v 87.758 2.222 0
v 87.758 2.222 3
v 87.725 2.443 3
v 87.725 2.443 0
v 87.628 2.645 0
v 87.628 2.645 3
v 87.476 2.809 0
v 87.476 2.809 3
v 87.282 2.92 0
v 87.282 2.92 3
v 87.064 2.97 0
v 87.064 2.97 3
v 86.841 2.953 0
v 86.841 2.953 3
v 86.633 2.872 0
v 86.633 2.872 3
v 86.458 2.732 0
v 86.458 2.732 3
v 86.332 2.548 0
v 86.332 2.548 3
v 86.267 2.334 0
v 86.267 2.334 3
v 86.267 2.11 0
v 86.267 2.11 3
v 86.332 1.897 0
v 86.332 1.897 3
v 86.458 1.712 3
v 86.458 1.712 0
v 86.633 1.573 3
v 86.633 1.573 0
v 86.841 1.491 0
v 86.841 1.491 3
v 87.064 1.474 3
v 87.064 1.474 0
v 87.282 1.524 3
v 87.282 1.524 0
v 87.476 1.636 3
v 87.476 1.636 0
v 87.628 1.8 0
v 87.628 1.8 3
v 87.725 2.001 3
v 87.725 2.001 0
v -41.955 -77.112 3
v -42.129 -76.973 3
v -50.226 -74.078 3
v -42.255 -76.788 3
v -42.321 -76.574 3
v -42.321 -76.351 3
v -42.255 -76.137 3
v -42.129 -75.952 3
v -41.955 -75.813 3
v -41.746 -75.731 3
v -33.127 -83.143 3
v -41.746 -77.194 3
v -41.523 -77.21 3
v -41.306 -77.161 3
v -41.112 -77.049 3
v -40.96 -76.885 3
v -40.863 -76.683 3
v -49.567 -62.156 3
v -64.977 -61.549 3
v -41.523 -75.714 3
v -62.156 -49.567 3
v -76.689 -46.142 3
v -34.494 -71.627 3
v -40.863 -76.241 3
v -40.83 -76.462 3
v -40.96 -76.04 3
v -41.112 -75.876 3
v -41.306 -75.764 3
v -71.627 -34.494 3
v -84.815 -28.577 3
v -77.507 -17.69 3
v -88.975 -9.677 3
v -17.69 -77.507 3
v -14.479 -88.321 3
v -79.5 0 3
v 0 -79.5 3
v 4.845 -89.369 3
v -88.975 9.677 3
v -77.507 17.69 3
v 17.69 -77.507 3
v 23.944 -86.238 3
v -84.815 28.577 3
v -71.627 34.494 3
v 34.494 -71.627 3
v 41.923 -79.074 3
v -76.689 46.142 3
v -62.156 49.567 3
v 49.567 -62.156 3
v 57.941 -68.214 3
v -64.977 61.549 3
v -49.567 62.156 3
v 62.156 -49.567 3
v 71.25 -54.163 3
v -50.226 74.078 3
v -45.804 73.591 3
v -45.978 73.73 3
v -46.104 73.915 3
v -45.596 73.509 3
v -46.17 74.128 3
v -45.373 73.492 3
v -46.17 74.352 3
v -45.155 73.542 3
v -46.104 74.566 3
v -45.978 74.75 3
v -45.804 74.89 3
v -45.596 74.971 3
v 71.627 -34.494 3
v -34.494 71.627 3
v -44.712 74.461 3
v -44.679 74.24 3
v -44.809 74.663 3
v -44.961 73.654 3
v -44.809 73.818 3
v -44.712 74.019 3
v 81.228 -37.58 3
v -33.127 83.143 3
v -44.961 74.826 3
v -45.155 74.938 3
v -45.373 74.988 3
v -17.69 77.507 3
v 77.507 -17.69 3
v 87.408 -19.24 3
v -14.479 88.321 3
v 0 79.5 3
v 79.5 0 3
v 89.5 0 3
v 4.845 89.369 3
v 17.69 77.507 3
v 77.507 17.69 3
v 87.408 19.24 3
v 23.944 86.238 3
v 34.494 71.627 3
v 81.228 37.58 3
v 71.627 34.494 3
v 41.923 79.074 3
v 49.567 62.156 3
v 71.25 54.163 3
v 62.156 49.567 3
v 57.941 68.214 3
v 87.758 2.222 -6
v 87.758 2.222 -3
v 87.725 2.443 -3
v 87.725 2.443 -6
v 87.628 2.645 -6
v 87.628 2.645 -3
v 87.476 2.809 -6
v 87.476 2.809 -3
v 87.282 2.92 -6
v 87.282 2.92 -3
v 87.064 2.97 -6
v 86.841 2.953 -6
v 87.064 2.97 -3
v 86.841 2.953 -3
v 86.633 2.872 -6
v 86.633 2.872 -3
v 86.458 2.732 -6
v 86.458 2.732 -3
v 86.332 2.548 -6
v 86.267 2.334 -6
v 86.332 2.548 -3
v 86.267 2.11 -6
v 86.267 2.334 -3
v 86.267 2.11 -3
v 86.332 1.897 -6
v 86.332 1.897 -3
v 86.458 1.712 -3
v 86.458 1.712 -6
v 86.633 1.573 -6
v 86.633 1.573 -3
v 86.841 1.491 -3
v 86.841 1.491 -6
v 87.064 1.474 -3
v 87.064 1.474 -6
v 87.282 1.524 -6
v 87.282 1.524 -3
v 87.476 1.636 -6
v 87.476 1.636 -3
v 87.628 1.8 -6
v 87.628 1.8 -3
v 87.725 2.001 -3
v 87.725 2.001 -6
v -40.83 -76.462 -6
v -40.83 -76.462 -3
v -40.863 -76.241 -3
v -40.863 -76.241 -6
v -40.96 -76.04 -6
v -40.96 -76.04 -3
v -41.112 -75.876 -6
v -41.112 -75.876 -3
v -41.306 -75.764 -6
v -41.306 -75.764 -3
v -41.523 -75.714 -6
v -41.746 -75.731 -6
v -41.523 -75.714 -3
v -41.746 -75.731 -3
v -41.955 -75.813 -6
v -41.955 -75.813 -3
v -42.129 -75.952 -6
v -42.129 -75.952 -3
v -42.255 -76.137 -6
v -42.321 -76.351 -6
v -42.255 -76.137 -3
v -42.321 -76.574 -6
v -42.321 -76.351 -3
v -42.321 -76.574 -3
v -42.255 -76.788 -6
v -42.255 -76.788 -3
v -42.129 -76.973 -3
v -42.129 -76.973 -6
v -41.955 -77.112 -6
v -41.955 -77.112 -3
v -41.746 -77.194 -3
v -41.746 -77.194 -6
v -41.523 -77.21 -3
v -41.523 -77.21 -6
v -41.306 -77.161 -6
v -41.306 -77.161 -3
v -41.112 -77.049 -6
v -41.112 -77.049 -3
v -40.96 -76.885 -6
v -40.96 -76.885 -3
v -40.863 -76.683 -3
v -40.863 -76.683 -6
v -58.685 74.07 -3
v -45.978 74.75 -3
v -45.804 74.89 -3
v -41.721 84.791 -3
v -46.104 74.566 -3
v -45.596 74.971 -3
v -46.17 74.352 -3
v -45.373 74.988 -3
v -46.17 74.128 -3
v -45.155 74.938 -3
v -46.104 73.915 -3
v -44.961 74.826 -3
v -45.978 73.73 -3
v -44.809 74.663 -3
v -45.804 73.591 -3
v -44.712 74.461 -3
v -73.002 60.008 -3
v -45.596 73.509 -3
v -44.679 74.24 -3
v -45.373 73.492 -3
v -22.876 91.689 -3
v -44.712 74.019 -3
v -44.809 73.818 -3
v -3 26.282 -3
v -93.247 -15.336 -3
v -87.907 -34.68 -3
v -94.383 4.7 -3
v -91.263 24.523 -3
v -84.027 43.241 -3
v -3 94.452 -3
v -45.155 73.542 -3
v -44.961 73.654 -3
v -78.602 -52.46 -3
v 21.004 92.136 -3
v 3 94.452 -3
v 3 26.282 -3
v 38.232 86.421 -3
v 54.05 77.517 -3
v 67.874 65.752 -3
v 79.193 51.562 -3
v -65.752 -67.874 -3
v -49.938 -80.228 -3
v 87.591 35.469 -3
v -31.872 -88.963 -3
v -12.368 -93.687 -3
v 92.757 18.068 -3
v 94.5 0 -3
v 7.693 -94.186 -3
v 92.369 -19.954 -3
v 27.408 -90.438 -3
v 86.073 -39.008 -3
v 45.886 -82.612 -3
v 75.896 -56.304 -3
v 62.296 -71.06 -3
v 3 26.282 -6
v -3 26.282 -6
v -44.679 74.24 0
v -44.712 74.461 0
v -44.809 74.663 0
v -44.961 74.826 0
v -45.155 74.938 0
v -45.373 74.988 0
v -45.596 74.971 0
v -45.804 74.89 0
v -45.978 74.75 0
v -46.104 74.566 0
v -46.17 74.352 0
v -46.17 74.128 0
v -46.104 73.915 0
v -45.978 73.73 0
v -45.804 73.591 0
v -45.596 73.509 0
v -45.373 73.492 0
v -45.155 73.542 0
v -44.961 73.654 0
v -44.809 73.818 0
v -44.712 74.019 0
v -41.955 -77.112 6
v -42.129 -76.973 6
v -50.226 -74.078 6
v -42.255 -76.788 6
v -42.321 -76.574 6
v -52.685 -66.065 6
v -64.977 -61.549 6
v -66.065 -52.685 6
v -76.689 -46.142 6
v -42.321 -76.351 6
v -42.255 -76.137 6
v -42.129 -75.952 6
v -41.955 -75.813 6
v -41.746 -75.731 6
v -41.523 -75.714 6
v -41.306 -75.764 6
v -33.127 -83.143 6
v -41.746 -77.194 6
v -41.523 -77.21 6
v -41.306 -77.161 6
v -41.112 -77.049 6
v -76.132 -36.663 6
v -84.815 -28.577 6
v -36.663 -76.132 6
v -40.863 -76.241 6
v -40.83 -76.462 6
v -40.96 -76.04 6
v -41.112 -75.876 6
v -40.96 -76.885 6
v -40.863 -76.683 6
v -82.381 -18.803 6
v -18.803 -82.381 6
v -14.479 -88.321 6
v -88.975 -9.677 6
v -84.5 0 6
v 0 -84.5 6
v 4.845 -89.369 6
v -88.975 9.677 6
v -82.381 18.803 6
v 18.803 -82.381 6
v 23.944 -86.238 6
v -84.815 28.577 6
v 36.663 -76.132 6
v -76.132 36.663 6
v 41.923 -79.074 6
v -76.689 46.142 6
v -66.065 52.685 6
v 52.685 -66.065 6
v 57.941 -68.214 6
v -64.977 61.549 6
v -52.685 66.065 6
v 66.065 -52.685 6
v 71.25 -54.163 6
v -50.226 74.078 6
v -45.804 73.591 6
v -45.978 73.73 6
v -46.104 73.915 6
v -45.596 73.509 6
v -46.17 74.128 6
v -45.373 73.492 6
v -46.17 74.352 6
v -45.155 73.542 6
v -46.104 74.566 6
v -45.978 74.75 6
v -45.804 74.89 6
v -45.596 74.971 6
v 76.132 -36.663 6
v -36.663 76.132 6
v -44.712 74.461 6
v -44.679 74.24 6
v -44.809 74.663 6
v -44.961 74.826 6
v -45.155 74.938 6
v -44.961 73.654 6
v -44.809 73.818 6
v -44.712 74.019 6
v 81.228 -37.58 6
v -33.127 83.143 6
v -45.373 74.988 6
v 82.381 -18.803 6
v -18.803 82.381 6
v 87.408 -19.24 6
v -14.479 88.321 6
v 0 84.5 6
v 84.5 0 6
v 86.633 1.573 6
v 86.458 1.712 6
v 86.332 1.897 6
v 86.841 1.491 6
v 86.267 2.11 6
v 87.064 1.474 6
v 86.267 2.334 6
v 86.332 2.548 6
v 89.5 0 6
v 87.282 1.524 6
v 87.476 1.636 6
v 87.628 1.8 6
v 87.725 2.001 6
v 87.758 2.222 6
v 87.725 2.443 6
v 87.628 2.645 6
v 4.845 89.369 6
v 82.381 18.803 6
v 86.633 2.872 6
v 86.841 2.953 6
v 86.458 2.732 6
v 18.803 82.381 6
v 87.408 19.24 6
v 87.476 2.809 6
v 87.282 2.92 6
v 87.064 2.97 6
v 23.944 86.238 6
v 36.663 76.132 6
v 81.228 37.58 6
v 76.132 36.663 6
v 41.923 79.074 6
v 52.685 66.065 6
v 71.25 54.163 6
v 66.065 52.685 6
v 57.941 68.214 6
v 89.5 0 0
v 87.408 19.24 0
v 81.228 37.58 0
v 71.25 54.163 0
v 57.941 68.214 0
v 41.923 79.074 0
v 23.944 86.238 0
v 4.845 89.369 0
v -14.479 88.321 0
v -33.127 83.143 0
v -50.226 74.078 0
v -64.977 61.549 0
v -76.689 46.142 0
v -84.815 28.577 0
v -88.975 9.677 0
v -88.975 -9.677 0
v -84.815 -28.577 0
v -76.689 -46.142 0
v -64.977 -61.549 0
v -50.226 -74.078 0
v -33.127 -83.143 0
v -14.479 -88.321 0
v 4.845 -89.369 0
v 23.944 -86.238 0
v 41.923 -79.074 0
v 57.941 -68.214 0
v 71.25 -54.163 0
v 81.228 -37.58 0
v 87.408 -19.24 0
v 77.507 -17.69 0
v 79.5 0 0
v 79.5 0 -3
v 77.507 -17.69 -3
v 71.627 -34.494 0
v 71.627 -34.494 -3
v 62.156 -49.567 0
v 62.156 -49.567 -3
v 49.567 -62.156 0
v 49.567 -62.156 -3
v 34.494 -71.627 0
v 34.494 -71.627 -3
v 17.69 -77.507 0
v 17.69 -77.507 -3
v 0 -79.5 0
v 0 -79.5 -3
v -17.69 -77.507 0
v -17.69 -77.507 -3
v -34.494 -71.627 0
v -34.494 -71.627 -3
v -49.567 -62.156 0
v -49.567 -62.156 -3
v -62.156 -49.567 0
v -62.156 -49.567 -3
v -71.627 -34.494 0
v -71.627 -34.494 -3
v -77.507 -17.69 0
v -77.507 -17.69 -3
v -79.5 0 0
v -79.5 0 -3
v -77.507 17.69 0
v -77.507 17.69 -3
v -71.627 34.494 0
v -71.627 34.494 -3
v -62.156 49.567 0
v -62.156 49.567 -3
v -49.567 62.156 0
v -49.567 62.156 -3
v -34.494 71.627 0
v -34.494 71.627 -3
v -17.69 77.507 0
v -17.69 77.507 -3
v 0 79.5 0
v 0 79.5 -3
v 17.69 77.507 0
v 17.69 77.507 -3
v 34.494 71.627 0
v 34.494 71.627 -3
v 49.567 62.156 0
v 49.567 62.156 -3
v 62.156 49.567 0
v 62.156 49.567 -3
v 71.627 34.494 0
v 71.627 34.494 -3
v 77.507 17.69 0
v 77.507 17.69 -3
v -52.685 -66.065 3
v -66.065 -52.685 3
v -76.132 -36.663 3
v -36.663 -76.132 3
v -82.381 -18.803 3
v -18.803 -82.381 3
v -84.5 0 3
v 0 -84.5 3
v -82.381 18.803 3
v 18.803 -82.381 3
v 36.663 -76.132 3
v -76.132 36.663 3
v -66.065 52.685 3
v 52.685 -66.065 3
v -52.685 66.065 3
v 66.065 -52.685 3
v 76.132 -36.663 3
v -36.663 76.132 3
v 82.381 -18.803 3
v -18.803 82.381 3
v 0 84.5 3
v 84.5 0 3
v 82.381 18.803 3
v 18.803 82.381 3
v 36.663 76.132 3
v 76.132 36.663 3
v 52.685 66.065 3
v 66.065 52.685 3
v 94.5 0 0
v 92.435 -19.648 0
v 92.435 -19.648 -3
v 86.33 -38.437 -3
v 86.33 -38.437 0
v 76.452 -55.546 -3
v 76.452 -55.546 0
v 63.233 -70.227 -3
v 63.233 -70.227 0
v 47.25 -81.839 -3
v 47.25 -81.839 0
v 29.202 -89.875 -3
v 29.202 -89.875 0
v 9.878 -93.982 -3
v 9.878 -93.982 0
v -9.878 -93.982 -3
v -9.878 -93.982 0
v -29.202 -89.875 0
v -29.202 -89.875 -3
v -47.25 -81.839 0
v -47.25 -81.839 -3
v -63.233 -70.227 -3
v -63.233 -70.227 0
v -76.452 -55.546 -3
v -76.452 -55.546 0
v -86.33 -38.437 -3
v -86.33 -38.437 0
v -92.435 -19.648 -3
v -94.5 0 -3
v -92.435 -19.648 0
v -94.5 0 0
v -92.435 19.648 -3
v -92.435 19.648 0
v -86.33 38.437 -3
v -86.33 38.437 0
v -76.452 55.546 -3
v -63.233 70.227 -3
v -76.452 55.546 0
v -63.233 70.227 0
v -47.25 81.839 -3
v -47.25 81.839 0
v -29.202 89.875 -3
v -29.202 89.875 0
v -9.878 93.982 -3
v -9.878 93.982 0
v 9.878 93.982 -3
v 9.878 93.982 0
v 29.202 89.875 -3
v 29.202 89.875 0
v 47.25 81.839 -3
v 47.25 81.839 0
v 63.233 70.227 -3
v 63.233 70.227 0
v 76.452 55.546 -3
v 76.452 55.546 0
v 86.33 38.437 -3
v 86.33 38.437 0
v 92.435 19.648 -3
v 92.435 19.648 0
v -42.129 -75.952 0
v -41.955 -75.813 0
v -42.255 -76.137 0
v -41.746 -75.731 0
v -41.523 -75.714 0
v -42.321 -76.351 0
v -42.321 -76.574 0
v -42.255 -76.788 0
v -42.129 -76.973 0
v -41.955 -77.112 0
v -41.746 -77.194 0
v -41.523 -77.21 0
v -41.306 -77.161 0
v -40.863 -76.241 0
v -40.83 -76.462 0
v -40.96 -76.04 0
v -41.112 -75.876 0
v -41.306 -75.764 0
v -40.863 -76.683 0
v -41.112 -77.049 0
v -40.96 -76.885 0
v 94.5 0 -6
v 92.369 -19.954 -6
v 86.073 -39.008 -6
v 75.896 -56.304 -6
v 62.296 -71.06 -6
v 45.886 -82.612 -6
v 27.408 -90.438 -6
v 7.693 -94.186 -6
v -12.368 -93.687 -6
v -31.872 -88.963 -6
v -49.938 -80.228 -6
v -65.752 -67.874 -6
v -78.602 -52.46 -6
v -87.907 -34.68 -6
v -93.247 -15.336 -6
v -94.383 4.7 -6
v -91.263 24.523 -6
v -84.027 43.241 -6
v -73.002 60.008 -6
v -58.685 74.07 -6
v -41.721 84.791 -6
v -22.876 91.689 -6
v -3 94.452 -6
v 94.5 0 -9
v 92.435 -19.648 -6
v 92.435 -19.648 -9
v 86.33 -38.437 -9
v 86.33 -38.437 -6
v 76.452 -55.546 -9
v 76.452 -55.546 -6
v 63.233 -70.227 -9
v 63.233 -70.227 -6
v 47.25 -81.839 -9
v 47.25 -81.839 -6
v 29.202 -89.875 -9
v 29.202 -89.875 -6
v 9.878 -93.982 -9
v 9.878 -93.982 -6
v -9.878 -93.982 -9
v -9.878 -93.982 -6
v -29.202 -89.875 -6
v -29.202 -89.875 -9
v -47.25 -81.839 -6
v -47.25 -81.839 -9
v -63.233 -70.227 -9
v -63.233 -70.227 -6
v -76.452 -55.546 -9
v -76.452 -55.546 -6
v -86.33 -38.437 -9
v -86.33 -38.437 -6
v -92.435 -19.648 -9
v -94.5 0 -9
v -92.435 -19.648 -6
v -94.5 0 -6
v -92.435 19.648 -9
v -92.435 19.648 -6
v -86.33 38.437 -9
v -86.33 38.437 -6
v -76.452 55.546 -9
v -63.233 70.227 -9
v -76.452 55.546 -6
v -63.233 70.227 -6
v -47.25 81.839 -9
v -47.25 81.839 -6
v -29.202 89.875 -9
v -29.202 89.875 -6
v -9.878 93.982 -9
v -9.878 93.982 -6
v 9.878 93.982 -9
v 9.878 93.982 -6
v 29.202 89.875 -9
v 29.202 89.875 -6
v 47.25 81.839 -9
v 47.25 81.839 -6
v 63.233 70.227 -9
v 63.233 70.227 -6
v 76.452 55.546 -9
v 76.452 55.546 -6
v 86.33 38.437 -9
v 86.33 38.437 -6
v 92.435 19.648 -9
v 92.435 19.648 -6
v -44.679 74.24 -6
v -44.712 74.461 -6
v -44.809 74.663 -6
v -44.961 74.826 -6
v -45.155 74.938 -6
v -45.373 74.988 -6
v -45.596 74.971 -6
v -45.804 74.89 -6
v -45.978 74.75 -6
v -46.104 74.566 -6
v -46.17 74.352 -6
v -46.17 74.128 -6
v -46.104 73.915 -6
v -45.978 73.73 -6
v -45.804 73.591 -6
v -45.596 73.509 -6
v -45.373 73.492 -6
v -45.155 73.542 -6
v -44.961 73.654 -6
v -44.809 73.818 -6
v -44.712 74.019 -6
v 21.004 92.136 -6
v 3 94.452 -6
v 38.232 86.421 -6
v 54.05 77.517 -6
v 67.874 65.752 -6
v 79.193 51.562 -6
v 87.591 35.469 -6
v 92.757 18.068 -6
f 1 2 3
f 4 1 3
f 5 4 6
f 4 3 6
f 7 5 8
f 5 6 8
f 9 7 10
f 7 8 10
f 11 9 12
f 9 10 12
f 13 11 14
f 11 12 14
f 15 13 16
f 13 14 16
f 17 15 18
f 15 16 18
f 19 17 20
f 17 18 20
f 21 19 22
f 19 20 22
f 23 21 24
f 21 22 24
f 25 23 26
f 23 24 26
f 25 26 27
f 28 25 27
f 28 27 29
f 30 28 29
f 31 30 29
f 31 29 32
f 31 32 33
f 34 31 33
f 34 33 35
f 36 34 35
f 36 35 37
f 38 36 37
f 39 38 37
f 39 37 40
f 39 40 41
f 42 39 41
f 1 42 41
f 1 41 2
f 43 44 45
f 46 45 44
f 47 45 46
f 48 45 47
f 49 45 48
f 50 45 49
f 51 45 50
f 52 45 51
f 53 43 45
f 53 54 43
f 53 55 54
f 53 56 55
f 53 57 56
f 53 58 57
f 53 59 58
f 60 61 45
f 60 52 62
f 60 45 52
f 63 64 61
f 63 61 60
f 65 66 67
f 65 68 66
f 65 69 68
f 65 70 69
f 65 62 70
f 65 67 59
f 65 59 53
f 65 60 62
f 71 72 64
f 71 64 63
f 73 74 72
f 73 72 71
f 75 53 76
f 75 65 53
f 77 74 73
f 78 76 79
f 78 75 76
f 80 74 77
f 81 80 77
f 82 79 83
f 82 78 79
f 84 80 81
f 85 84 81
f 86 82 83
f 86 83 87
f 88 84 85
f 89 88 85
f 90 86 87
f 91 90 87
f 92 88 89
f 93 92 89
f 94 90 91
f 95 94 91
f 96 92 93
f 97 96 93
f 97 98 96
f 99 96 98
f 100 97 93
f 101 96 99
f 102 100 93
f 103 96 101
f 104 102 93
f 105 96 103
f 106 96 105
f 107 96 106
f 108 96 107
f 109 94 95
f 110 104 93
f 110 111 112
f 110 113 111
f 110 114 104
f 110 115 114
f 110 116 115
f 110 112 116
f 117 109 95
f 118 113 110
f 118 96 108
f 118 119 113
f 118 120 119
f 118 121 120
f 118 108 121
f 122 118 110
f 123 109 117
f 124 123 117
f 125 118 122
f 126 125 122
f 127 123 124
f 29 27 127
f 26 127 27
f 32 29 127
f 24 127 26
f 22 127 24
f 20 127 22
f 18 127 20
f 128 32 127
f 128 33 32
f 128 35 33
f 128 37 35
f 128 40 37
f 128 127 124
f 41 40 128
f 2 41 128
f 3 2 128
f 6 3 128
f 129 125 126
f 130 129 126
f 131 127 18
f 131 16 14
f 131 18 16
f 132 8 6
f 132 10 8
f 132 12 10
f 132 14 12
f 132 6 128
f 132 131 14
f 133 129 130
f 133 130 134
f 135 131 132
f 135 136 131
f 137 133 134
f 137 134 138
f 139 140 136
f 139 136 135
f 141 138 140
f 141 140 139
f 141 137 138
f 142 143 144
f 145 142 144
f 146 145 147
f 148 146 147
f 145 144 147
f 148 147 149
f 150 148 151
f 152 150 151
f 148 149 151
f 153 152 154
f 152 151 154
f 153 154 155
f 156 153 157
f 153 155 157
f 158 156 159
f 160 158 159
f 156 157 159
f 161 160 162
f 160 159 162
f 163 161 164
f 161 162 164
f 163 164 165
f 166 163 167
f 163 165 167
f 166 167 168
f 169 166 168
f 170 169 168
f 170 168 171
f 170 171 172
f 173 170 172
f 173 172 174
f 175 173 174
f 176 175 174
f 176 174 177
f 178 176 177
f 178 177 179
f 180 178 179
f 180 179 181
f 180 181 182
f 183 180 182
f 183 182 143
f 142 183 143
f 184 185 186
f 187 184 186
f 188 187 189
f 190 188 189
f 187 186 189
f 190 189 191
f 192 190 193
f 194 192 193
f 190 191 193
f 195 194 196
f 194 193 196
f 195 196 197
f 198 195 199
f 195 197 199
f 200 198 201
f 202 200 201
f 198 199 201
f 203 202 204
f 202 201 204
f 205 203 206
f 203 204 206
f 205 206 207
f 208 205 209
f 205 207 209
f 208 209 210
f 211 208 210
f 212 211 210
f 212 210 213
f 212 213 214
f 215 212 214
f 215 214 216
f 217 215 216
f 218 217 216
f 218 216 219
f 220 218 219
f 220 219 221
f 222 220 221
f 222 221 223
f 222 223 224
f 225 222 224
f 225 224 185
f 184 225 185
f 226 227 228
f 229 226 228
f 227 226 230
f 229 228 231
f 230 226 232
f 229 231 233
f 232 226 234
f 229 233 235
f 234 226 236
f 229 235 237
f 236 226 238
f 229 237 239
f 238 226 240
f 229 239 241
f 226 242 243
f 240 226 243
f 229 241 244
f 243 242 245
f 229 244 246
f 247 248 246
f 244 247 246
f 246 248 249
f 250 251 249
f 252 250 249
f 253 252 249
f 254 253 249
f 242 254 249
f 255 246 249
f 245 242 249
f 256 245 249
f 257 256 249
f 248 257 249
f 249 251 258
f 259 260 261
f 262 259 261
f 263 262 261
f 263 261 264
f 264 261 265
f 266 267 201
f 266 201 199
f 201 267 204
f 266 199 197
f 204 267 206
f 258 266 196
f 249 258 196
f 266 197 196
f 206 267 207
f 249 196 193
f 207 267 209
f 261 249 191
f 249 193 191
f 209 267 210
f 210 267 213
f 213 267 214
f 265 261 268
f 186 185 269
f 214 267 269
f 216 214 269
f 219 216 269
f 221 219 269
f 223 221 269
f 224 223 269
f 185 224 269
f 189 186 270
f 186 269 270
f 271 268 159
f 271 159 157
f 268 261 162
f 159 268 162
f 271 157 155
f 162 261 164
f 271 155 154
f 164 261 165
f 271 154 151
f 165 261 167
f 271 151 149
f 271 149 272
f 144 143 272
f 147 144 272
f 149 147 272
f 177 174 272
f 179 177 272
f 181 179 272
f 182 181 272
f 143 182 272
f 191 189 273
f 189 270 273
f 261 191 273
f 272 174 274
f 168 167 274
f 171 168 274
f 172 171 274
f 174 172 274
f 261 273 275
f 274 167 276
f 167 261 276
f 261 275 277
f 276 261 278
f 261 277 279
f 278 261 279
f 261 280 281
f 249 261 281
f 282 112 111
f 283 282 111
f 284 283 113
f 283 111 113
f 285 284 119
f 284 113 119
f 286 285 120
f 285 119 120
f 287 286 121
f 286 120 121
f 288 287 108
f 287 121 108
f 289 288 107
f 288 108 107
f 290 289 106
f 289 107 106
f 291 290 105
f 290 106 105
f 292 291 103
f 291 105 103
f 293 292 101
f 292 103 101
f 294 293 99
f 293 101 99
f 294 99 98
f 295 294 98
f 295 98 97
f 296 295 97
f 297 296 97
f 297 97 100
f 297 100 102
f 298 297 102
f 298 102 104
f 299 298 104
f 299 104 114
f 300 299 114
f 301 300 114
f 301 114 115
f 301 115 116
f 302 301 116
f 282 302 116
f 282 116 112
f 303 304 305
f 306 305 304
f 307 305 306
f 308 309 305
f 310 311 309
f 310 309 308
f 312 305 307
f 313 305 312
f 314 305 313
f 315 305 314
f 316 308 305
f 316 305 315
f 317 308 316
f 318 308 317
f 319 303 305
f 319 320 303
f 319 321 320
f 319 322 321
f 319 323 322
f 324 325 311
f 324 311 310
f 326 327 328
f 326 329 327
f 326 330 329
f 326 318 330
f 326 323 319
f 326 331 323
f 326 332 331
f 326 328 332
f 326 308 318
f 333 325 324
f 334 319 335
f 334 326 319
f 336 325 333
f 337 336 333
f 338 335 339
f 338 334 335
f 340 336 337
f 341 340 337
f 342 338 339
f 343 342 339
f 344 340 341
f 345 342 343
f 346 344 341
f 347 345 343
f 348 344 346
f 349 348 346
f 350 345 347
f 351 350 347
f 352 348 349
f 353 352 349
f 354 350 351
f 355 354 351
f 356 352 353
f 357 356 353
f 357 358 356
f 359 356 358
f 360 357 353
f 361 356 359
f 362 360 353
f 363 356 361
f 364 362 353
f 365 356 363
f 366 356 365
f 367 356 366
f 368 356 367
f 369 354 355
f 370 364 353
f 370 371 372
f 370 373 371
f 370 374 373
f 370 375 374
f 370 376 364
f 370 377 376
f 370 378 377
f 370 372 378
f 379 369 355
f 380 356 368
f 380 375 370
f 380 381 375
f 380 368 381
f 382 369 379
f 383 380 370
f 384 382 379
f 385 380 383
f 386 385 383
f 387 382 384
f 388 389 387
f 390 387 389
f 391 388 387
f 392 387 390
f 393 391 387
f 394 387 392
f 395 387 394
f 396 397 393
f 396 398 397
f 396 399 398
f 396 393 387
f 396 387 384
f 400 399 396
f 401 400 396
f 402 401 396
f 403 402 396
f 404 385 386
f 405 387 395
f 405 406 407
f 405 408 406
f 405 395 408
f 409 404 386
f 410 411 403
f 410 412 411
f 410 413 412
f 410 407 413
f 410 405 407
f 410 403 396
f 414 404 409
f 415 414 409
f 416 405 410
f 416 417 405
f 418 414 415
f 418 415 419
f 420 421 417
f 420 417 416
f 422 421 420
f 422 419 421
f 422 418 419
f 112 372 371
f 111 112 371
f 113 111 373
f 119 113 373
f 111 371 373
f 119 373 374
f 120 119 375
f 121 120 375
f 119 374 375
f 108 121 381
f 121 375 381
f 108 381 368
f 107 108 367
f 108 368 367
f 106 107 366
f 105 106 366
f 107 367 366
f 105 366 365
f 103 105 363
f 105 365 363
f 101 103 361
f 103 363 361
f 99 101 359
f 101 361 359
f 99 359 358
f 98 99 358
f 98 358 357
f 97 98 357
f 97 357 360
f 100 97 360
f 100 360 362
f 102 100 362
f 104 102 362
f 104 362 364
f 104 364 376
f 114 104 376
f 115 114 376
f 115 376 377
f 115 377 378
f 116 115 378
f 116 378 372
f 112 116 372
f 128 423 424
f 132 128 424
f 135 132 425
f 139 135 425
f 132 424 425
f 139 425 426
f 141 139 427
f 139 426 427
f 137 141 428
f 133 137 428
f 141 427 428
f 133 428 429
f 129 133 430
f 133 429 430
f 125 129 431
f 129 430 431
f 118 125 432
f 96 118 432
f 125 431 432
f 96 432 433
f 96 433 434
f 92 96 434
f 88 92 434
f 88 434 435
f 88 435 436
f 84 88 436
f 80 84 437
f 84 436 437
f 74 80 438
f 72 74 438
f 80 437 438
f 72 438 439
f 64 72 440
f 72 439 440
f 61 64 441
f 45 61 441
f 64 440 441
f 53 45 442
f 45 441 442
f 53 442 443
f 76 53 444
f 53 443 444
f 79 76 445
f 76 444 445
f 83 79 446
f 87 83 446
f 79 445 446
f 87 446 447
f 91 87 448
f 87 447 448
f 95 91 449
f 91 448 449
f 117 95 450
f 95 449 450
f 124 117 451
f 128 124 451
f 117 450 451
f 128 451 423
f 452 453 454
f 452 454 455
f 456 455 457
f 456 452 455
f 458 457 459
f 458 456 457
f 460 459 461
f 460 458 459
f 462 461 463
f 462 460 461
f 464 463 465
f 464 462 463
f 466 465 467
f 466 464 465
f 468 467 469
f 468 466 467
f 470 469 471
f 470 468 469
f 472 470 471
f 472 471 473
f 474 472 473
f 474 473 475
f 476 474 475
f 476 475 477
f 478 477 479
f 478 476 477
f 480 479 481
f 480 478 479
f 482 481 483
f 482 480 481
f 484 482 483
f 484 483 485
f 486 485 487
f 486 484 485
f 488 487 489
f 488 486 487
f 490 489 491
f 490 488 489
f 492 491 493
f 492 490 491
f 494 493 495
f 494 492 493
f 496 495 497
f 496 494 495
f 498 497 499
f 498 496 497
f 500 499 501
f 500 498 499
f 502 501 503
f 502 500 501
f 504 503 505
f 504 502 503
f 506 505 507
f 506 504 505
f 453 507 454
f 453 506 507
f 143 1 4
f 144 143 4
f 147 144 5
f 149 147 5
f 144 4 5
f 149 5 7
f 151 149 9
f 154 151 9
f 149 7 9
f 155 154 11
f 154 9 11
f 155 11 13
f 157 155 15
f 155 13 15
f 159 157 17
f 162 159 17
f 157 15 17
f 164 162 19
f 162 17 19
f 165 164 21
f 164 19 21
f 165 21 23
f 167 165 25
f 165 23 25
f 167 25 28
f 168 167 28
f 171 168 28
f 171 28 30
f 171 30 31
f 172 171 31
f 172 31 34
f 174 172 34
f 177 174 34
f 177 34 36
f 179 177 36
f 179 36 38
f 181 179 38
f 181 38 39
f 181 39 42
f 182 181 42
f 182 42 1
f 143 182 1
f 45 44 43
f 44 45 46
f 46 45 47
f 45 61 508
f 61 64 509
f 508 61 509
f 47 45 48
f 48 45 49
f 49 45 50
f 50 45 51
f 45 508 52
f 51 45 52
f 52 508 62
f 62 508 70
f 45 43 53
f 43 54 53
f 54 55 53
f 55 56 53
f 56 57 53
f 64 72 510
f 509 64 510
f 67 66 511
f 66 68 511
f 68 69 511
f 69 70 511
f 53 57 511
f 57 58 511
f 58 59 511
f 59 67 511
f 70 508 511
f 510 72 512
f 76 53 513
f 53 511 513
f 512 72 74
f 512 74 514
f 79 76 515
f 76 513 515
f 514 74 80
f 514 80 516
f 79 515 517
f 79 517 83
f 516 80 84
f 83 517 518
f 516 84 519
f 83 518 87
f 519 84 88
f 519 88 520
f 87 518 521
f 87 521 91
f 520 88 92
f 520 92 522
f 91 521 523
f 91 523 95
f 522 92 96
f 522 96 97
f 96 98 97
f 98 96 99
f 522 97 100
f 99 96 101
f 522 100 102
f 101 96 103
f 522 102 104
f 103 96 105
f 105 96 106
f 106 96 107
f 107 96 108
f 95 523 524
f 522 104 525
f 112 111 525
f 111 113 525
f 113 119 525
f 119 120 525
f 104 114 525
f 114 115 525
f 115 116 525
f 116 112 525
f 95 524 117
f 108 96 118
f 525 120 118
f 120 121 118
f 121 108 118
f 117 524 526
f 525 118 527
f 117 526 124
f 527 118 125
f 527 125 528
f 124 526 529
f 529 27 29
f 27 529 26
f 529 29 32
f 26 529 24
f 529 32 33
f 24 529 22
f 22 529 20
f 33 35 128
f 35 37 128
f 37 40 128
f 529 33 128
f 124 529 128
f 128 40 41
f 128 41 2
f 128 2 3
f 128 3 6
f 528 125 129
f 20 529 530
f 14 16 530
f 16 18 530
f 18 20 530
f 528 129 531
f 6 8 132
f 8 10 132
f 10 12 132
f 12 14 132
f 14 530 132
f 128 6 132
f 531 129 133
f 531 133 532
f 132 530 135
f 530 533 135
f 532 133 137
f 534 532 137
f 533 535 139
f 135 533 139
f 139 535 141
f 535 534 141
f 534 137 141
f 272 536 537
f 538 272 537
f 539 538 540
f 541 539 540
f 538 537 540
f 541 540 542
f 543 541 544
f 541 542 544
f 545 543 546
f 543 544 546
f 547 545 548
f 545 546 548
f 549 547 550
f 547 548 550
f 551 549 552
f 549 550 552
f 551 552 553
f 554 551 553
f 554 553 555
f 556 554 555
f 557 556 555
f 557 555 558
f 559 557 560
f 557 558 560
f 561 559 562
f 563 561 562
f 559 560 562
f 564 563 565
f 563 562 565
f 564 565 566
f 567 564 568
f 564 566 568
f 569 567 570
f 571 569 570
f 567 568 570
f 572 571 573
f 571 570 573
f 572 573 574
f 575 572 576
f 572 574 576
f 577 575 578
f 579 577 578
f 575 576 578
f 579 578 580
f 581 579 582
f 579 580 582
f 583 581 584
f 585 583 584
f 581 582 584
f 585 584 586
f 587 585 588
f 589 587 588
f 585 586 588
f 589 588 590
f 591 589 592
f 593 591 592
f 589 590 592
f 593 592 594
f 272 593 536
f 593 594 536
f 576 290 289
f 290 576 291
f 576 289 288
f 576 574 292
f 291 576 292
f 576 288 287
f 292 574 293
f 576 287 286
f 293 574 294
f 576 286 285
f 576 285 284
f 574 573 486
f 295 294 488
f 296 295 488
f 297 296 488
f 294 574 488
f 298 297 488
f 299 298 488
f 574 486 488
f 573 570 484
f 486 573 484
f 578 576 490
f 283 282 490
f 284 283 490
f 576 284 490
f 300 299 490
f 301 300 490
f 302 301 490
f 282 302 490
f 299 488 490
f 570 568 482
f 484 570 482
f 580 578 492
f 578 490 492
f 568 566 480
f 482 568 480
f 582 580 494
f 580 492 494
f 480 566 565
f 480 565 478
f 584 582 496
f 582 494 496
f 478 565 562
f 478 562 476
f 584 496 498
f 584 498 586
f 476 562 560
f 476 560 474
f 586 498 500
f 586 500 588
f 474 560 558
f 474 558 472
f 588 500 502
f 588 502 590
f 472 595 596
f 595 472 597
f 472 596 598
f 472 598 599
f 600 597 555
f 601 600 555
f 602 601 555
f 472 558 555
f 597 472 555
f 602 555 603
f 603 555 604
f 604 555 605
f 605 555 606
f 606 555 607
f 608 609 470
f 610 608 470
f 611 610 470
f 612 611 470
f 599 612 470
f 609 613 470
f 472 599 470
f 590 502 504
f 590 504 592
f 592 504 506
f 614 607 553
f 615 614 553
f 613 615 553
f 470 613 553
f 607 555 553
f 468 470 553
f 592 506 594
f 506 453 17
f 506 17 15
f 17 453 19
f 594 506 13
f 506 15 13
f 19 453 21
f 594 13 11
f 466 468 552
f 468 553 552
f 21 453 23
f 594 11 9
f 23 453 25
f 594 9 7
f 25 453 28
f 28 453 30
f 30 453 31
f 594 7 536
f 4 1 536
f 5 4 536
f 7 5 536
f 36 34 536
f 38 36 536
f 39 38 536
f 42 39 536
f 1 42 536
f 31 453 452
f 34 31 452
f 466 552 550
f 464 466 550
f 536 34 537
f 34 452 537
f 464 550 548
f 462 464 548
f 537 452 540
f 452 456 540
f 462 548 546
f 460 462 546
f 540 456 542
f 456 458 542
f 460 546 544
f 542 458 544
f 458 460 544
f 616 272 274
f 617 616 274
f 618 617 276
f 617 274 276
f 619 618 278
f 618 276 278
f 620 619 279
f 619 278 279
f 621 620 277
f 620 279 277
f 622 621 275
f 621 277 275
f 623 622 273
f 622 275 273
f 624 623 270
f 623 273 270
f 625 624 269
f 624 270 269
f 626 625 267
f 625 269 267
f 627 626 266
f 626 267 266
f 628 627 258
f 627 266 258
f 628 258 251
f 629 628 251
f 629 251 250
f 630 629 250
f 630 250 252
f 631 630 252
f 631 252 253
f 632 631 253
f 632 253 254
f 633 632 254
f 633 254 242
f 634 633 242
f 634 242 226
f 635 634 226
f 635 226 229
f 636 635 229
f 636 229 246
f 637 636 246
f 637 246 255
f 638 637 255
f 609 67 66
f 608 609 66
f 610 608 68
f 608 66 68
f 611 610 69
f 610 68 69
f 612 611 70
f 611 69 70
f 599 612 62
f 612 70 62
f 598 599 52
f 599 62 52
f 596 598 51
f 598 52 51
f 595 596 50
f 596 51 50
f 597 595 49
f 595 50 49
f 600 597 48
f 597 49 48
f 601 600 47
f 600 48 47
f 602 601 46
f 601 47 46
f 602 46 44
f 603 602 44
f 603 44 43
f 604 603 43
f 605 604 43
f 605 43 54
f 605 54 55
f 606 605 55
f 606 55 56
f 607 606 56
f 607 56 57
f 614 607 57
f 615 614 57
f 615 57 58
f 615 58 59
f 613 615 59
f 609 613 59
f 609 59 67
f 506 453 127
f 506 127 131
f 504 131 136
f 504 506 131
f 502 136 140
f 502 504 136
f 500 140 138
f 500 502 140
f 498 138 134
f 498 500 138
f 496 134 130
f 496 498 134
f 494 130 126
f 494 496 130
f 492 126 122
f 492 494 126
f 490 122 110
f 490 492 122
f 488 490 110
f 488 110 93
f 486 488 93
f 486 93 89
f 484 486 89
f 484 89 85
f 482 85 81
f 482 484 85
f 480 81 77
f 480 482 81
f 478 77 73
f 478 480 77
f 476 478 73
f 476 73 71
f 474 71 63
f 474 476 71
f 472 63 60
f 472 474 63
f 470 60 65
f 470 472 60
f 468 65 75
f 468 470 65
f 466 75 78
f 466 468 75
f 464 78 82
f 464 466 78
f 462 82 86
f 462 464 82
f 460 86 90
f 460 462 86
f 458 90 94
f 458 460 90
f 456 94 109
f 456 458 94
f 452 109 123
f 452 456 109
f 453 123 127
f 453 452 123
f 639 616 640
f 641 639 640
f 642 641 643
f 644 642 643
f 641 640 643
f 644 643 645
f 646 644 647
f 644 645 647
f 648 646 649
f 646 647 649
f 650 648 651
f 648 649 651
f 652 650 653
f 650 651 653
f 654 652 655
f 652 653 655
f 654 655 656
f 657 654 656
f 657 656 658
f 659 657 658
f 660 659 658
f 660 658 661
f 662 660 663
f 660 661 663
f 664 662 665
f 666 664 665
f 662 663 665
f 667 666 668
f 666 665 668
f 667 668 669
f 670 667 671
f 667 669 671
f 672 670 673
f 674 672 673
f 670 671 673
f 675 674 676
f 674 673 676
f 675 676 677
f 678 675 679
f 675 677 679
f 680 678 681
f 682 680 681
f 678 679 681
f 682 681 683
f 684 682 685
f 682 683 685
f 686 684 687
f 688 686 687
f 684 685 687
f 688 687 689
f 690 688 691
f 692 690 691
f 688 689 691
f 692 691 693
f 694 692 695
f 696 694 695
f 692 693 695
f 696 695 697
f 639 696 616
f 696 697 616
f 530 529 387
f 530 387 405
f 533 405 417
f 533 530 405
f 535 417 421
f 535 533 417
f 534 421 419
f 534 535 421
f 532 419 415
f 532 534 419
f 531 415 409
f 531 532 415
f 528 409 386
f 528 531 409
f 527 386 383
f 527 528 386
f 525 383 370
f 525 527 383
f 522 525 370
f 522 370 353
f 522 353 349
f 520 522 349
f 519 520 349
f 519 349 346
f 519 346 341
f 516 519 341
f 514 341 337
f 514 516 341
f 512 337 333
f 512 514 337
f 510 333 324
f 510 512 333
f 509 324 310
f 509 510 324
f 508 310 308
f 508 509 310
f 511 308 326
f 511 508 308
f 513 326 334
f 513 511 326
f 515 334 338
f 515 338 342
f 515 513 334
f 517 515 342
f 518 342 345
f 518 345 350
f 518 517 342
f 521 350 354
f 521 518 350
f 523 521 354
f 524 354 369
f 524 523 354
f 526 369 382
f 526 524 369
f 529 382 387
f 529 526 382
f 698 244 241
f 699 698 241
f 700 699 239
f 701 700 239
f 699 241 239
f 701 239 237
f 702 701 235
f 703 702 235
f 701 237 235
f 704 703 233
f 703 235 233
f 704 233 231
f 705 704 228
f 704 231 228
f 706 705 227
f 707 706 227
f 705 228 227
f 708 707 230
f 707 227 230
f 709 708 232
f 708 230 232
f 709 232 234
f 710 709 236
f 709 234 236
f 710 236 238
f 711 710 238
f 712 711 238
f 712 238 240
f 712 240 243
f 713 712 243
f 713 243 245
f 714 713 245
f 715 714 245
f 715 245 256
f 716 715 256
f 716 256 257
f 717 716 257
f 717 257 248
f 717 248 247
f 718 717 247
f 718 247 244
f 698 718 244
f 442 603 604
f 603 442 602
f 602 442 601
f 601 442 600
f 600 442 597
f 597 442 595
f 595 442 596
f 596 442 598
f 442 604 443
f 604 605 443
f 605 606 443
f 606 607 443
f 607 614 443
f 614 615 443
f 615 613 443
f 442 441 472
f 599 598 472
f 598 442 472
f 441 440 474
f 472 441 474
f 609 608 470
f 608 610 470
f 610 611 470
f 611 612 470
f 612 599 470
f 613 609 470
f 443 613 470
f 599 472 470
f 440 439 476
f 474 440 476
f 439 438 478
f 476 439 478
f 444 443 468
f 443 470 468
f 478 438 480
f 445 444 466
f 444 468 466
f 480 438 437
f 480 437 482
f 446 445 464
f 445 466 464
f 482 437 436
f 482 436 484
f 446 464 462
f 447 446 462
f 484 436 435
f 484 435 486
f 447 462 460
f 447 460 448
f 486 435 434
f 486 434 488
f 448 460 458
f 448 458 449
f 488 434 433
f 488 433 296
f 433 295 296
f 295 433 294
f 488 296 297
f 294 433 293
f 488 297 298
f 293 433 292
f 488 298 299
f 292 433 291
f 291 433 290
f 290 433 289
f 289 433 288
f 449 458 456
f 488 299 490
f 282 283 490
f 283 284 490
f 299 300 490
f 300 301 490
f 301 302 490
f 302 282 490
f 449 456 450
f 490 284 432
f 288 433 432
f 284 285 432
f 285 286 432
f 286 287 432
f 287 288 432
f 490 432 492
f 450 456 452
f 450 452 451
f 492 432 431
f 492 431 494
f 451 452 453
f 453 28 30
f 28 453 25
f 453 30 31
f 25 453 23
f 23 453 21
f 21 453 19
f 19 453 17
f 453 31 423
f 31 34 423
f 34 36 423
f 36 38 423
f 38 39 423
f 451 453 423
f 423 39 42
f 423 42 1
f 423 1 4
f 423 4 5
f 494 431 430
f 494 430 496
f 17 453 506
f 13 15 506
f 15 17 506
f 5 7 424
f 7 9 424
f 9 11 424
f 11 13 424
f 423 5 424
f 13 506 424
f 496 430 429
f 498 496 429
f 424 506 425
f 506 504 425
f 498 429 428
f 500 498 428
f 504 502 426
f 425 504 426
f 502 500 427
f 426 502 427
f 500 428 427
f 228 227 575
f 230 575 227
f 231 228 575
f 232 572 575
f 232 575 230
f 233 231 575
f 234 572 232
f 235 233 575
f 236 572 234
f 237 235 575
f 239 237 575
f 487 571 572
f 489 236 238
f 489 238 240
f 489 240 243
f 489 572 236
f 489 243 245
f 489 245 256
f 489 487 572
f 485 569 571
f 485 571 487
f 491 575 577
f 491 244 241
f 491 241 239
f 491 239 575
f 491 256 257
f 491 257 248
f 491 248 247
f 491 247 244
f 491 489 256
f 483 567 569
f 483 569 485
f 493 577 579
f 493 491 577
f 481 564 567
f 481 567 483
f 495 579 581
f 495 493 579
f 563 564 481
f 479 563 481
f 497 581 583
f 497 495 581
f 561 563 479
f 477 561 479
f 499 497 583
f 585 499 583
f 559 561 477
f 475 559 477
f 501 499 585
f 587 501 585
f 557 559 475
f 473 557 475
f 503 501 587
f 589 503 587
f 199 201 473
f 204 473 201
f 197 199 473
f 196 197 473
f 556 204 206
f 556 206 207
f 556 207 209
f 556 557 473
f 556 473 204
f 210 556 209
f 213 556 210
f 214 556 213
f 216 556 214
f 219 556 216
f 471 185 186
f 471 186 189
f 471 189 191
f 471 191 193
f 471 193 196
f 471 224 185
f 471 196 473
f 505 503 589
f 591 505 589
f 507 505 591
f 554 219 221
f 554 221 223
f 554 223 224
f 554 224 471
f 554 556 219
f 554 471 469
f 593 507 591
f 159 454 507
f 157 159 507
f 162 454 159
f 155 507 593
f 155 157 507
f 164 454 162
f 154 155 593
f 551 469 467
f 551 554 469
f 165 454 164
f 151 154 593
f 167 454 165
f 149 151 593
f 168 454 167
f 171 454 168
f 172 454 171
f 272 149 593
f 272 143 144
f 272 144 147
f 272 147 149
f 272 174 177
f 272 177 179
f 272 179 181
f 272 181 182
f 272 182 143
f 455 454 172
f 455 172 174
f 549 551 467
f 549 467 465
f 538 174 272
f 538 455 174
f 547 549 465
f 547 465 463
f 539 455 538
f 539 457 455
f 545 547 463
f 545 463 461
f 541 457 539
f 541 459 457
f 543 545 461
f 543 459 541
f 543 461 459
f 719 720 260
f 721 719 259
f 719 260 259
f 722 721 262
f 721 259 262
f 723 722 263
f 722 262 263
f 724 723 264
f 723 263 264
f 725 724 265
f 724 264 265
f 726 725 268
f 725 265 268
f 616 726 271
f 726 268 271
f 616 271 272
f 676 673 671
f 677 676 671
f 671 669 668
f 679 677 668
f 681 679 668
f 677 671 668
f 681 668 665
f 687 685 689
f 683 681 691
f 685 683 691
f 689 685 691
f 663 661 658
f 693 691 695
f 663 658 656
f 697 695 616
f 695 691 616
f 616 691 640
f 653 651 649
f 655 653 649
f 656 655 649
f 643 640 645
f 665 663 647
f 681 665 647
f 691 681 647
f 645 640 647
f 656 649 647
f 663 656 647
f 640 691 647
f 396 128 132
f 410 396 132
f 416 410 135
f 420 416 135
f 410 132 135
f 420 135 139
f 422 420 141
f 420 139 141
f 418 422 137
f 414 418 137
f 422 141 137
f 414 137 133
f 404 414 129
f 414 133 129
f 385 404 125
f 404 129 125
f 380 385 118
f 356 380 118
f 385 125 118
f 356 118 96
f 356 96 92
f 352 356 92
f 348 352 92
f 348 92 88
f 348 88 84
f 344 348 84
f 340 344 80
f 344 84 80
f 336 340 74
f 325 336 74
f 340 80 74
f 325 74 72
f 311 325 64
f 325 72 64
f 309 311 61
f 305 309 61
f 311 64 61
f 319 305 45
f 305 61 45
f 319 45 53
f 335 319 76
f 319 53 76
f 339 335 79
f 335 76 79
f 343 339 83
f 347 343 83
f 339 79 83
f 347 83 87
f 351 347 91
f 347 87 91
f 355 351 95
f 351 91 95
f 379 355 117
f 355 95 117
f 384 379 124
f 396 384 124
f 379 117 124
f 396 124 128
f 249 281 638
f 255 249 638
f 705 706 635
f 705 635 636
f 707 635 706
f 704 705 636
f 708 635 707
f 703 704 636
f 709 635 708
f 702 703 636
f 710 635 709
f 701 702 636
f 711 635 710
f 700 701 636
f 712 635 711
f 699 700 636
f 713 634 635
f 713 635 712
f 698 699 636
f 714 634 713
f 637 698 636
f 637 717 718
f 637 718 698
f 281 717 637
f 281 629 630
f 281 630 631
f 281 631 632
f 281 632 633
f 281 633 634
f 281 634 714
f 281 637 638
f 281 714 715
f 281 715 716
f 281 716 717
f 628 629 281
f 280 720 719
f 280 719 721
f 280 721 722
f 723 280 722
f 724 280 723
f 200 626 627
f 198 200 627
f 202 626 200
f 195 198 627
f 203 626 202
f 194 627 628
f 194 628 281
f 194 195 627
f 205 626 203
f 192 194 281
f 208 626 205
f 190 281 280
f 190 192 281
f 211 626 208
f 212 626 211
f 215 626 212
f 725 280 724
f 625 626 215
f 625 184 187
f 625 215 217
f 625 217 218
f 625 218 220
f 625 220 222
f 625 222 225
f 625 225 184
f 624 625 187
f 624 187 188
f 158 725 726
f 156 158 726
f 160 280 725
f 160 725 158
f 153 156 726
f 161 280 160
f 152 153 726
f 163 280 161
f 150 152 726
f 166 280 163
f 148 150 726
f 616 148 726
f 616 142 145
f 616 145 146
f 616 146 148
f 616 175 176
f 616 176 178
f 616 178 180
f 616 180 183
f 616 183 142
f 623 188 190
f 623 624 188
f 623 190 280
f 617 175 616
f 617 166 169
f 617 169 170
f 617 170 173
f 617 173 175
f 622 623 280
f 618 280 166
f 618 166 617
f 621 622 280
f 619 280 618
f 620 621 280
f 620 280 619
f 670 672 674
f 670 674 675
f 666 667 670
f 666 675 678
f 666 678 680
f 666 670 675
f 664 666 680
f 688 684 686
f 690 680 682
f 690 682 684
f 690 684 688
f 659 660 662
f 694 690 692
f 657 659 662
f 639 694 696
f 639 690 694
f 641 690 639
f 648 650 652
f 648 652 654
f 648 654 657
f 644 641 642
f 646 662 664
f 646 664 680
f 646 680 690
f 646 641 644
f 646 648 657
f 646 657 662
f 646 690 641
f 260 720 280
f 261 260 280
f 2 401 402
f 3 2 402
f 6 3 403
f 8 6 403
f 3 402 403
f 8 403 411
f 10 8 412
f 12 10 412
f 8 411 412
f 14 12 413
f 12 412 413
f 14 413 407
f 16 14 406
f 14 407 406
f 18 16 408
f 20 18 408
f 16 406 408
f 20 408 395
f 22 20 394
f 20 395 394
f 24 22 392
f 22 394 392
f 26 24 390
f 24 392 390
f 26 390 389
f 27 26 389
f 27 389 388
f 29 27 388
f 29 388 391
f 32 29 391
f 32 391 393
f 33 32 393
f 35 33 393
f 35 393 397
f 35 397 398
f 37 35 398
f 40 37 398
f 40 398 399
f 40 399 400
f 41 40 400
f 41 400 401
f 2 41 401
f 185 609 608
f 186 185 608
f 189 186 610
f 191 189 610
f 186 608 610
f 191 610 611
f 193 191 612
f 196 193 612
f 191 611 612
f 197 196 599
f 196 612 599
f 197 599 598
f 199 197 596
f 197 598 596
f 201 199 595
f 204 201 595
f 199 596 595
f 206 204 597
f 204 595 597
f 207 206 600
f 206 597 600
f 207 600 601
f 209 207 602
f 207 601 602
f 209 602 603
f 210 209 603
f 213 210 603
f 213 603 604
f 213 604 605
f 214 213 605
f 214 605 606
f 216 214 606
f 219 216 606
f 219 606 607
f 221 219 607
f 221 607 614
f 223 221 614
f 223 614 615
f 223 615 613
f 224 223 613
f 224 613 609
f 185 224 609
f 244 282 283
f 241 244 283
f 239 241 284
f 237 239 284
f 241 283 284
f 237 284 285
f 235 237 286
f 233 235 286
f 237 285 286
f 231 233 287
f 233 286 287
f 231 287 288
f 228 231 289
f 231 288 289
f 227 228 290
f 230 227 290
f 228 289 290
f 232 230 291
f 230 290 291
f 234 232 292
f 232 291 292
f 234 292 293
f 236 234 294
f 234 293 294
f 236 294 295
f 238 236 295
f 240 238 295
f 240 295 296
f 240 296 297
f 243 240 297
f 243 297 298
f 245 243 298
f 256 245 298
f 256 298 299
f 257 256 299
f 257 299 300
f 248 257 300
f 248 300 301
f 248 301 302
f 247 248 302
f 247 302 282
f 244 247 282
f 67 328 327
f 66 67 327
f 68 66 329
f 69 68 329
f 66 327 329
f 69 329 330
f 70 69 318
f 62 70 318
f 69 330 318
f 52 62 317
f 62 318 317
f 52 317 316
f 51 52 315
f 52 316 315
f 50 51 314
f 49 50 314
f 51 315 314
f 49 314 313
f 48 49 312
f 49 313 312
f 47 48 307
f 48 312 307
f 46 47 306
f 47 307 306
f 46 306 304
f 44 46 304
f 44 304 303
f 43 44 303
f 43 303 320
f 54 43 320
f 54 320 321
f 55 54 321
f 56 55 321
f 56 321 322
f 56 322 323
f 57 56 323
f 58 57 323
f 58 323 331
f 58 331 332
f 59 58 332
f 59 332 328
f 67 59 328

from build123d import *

# Parameters (mm, degrees)
F1_R      = 89.5
F1_R_2    = 79.5
F2_DEPTH  = 3
F3_R      = 89.5
F3_R_2    = 84.5
F4_DEPTH  = 3
F5_R      = 94.5
F5_R_2    = 79.5
F6_DEPTH  = 3
F7_R      = 94.5
F8_DEPTH  = 3
F9_R      = 0.75
F10_DEPTH = 12.001
F12_DEPTH = 25
F13_R     = 94.5
F14_DEPTH = 3


with BuildPart() as f2:
    # F1 (on Top) → F2 (new body)
    with BuildSketch(Plane.XY):
        Circle(F1_R)
        Circle(F1_R_2, mode=Mode.SUBTRACT)
    extrude(amount=F2_DEPTH)


with BuildPart() as f4:
    # F3 (on face) → F4 (new body)
    with BuildSketch(Plane.XY.offset(3)):
        Circle(F3_R)
        Circle(F3_R_2, mode=Mode.SUBTRACT)
    extrude(amount=F4_DEPTH)


with BuildPart() as f6:
    # F5 (on face) → F6 (new body)
    with BuildSketch(Plane(origin=(0, 0, 0), x_dir=(1, 0, 0), z_dir=(0, 0, -1))):
        Circle(F5_R)
        Circle(F5_R_2, mode=Mode.SUBTRACT)
    extrude(amount=F6_DEPTH)


with BuildPart() as f8:
    # F7 (on face) → F8 (new body)
    with BuildSketch(Plane(origin=(0, 0, -3), x_dir=(1, 0, 0), z_dir=(0, 0, -1))):
        Circle(F7_R)
    extrude(amount=F8_DEPTH)


with BuildPart() as f10_tool:
    # F9 (on face) → F10 (new body, through all)
    with BuildSketch(Plane.XY.offset(6)):
        with Locations((87.0081335306, 2.2222734988)):
            Circle(F9_R)
        with Locations((-45.4286120694, 74.240117224)):
            Circle(F9_R)
        with Locations((-41.5795214612, -76.4623907228)):
            Circle(F9_R)
    extrude(amount=-F10_DEPTH)


with BuildPart() as f2_1:
    add(f2.part)

    # F10: cut by f10_tool
    add(f10_tool.part, mode=Mode.SUBTRACT)


with BuildPart() as f4_1:
    add(f4.part)

    # F10: cut by f10_tool
    add(f10_tool.part, mode=Mode.SUBTRACT)


with BuildPart() as f6_1:
    add(f6.part)

    # F10: cut by f10_tool
    add(f10_tool.part, mode=Mode.SUBTRACT)


with BuildPart() as f8_1:
    add(f8.part)

    # F10: cut by f10_tool
    add(f10_tool.part, mode=Mode.SUBTRACT)

    # F11 (on face) → F12 (cut)
    with BuildSketch(Plane(origin=(0, 0, -6), x_dir=(1, 0, 0), z_dir=(0, 0, -1))):
        with BuildLine():
            Line((3, -26.2818075716), (-3, -26.2818075716))
            Line((-3, -26.2818075716), (-3, -94.4523689486))
            ThreePointArc((-3, -94.4523689486), (0, -94.5), (3, -94.4523689486))
            Line((3, -94.4523689486), (3, -26.2818075716))
        make_face()
    extrude(amount=-F12_DEPTH, mode=Mode.SUBTRACT)


with BuildPart() as f14:
    # F13 (on face) → F14 (new body)
    with BuildSketch(Plane(origin=(0, 0, -6), x_dir=(1, 0, 0), z_dir=(0, 0, -1))):
        Circle(F13_R)
    extrude(amount=F14_DEPTH)


solid = Compound([f2_1.part, f4_1.part, f6_1.part, f8_1.part, f14.part])
